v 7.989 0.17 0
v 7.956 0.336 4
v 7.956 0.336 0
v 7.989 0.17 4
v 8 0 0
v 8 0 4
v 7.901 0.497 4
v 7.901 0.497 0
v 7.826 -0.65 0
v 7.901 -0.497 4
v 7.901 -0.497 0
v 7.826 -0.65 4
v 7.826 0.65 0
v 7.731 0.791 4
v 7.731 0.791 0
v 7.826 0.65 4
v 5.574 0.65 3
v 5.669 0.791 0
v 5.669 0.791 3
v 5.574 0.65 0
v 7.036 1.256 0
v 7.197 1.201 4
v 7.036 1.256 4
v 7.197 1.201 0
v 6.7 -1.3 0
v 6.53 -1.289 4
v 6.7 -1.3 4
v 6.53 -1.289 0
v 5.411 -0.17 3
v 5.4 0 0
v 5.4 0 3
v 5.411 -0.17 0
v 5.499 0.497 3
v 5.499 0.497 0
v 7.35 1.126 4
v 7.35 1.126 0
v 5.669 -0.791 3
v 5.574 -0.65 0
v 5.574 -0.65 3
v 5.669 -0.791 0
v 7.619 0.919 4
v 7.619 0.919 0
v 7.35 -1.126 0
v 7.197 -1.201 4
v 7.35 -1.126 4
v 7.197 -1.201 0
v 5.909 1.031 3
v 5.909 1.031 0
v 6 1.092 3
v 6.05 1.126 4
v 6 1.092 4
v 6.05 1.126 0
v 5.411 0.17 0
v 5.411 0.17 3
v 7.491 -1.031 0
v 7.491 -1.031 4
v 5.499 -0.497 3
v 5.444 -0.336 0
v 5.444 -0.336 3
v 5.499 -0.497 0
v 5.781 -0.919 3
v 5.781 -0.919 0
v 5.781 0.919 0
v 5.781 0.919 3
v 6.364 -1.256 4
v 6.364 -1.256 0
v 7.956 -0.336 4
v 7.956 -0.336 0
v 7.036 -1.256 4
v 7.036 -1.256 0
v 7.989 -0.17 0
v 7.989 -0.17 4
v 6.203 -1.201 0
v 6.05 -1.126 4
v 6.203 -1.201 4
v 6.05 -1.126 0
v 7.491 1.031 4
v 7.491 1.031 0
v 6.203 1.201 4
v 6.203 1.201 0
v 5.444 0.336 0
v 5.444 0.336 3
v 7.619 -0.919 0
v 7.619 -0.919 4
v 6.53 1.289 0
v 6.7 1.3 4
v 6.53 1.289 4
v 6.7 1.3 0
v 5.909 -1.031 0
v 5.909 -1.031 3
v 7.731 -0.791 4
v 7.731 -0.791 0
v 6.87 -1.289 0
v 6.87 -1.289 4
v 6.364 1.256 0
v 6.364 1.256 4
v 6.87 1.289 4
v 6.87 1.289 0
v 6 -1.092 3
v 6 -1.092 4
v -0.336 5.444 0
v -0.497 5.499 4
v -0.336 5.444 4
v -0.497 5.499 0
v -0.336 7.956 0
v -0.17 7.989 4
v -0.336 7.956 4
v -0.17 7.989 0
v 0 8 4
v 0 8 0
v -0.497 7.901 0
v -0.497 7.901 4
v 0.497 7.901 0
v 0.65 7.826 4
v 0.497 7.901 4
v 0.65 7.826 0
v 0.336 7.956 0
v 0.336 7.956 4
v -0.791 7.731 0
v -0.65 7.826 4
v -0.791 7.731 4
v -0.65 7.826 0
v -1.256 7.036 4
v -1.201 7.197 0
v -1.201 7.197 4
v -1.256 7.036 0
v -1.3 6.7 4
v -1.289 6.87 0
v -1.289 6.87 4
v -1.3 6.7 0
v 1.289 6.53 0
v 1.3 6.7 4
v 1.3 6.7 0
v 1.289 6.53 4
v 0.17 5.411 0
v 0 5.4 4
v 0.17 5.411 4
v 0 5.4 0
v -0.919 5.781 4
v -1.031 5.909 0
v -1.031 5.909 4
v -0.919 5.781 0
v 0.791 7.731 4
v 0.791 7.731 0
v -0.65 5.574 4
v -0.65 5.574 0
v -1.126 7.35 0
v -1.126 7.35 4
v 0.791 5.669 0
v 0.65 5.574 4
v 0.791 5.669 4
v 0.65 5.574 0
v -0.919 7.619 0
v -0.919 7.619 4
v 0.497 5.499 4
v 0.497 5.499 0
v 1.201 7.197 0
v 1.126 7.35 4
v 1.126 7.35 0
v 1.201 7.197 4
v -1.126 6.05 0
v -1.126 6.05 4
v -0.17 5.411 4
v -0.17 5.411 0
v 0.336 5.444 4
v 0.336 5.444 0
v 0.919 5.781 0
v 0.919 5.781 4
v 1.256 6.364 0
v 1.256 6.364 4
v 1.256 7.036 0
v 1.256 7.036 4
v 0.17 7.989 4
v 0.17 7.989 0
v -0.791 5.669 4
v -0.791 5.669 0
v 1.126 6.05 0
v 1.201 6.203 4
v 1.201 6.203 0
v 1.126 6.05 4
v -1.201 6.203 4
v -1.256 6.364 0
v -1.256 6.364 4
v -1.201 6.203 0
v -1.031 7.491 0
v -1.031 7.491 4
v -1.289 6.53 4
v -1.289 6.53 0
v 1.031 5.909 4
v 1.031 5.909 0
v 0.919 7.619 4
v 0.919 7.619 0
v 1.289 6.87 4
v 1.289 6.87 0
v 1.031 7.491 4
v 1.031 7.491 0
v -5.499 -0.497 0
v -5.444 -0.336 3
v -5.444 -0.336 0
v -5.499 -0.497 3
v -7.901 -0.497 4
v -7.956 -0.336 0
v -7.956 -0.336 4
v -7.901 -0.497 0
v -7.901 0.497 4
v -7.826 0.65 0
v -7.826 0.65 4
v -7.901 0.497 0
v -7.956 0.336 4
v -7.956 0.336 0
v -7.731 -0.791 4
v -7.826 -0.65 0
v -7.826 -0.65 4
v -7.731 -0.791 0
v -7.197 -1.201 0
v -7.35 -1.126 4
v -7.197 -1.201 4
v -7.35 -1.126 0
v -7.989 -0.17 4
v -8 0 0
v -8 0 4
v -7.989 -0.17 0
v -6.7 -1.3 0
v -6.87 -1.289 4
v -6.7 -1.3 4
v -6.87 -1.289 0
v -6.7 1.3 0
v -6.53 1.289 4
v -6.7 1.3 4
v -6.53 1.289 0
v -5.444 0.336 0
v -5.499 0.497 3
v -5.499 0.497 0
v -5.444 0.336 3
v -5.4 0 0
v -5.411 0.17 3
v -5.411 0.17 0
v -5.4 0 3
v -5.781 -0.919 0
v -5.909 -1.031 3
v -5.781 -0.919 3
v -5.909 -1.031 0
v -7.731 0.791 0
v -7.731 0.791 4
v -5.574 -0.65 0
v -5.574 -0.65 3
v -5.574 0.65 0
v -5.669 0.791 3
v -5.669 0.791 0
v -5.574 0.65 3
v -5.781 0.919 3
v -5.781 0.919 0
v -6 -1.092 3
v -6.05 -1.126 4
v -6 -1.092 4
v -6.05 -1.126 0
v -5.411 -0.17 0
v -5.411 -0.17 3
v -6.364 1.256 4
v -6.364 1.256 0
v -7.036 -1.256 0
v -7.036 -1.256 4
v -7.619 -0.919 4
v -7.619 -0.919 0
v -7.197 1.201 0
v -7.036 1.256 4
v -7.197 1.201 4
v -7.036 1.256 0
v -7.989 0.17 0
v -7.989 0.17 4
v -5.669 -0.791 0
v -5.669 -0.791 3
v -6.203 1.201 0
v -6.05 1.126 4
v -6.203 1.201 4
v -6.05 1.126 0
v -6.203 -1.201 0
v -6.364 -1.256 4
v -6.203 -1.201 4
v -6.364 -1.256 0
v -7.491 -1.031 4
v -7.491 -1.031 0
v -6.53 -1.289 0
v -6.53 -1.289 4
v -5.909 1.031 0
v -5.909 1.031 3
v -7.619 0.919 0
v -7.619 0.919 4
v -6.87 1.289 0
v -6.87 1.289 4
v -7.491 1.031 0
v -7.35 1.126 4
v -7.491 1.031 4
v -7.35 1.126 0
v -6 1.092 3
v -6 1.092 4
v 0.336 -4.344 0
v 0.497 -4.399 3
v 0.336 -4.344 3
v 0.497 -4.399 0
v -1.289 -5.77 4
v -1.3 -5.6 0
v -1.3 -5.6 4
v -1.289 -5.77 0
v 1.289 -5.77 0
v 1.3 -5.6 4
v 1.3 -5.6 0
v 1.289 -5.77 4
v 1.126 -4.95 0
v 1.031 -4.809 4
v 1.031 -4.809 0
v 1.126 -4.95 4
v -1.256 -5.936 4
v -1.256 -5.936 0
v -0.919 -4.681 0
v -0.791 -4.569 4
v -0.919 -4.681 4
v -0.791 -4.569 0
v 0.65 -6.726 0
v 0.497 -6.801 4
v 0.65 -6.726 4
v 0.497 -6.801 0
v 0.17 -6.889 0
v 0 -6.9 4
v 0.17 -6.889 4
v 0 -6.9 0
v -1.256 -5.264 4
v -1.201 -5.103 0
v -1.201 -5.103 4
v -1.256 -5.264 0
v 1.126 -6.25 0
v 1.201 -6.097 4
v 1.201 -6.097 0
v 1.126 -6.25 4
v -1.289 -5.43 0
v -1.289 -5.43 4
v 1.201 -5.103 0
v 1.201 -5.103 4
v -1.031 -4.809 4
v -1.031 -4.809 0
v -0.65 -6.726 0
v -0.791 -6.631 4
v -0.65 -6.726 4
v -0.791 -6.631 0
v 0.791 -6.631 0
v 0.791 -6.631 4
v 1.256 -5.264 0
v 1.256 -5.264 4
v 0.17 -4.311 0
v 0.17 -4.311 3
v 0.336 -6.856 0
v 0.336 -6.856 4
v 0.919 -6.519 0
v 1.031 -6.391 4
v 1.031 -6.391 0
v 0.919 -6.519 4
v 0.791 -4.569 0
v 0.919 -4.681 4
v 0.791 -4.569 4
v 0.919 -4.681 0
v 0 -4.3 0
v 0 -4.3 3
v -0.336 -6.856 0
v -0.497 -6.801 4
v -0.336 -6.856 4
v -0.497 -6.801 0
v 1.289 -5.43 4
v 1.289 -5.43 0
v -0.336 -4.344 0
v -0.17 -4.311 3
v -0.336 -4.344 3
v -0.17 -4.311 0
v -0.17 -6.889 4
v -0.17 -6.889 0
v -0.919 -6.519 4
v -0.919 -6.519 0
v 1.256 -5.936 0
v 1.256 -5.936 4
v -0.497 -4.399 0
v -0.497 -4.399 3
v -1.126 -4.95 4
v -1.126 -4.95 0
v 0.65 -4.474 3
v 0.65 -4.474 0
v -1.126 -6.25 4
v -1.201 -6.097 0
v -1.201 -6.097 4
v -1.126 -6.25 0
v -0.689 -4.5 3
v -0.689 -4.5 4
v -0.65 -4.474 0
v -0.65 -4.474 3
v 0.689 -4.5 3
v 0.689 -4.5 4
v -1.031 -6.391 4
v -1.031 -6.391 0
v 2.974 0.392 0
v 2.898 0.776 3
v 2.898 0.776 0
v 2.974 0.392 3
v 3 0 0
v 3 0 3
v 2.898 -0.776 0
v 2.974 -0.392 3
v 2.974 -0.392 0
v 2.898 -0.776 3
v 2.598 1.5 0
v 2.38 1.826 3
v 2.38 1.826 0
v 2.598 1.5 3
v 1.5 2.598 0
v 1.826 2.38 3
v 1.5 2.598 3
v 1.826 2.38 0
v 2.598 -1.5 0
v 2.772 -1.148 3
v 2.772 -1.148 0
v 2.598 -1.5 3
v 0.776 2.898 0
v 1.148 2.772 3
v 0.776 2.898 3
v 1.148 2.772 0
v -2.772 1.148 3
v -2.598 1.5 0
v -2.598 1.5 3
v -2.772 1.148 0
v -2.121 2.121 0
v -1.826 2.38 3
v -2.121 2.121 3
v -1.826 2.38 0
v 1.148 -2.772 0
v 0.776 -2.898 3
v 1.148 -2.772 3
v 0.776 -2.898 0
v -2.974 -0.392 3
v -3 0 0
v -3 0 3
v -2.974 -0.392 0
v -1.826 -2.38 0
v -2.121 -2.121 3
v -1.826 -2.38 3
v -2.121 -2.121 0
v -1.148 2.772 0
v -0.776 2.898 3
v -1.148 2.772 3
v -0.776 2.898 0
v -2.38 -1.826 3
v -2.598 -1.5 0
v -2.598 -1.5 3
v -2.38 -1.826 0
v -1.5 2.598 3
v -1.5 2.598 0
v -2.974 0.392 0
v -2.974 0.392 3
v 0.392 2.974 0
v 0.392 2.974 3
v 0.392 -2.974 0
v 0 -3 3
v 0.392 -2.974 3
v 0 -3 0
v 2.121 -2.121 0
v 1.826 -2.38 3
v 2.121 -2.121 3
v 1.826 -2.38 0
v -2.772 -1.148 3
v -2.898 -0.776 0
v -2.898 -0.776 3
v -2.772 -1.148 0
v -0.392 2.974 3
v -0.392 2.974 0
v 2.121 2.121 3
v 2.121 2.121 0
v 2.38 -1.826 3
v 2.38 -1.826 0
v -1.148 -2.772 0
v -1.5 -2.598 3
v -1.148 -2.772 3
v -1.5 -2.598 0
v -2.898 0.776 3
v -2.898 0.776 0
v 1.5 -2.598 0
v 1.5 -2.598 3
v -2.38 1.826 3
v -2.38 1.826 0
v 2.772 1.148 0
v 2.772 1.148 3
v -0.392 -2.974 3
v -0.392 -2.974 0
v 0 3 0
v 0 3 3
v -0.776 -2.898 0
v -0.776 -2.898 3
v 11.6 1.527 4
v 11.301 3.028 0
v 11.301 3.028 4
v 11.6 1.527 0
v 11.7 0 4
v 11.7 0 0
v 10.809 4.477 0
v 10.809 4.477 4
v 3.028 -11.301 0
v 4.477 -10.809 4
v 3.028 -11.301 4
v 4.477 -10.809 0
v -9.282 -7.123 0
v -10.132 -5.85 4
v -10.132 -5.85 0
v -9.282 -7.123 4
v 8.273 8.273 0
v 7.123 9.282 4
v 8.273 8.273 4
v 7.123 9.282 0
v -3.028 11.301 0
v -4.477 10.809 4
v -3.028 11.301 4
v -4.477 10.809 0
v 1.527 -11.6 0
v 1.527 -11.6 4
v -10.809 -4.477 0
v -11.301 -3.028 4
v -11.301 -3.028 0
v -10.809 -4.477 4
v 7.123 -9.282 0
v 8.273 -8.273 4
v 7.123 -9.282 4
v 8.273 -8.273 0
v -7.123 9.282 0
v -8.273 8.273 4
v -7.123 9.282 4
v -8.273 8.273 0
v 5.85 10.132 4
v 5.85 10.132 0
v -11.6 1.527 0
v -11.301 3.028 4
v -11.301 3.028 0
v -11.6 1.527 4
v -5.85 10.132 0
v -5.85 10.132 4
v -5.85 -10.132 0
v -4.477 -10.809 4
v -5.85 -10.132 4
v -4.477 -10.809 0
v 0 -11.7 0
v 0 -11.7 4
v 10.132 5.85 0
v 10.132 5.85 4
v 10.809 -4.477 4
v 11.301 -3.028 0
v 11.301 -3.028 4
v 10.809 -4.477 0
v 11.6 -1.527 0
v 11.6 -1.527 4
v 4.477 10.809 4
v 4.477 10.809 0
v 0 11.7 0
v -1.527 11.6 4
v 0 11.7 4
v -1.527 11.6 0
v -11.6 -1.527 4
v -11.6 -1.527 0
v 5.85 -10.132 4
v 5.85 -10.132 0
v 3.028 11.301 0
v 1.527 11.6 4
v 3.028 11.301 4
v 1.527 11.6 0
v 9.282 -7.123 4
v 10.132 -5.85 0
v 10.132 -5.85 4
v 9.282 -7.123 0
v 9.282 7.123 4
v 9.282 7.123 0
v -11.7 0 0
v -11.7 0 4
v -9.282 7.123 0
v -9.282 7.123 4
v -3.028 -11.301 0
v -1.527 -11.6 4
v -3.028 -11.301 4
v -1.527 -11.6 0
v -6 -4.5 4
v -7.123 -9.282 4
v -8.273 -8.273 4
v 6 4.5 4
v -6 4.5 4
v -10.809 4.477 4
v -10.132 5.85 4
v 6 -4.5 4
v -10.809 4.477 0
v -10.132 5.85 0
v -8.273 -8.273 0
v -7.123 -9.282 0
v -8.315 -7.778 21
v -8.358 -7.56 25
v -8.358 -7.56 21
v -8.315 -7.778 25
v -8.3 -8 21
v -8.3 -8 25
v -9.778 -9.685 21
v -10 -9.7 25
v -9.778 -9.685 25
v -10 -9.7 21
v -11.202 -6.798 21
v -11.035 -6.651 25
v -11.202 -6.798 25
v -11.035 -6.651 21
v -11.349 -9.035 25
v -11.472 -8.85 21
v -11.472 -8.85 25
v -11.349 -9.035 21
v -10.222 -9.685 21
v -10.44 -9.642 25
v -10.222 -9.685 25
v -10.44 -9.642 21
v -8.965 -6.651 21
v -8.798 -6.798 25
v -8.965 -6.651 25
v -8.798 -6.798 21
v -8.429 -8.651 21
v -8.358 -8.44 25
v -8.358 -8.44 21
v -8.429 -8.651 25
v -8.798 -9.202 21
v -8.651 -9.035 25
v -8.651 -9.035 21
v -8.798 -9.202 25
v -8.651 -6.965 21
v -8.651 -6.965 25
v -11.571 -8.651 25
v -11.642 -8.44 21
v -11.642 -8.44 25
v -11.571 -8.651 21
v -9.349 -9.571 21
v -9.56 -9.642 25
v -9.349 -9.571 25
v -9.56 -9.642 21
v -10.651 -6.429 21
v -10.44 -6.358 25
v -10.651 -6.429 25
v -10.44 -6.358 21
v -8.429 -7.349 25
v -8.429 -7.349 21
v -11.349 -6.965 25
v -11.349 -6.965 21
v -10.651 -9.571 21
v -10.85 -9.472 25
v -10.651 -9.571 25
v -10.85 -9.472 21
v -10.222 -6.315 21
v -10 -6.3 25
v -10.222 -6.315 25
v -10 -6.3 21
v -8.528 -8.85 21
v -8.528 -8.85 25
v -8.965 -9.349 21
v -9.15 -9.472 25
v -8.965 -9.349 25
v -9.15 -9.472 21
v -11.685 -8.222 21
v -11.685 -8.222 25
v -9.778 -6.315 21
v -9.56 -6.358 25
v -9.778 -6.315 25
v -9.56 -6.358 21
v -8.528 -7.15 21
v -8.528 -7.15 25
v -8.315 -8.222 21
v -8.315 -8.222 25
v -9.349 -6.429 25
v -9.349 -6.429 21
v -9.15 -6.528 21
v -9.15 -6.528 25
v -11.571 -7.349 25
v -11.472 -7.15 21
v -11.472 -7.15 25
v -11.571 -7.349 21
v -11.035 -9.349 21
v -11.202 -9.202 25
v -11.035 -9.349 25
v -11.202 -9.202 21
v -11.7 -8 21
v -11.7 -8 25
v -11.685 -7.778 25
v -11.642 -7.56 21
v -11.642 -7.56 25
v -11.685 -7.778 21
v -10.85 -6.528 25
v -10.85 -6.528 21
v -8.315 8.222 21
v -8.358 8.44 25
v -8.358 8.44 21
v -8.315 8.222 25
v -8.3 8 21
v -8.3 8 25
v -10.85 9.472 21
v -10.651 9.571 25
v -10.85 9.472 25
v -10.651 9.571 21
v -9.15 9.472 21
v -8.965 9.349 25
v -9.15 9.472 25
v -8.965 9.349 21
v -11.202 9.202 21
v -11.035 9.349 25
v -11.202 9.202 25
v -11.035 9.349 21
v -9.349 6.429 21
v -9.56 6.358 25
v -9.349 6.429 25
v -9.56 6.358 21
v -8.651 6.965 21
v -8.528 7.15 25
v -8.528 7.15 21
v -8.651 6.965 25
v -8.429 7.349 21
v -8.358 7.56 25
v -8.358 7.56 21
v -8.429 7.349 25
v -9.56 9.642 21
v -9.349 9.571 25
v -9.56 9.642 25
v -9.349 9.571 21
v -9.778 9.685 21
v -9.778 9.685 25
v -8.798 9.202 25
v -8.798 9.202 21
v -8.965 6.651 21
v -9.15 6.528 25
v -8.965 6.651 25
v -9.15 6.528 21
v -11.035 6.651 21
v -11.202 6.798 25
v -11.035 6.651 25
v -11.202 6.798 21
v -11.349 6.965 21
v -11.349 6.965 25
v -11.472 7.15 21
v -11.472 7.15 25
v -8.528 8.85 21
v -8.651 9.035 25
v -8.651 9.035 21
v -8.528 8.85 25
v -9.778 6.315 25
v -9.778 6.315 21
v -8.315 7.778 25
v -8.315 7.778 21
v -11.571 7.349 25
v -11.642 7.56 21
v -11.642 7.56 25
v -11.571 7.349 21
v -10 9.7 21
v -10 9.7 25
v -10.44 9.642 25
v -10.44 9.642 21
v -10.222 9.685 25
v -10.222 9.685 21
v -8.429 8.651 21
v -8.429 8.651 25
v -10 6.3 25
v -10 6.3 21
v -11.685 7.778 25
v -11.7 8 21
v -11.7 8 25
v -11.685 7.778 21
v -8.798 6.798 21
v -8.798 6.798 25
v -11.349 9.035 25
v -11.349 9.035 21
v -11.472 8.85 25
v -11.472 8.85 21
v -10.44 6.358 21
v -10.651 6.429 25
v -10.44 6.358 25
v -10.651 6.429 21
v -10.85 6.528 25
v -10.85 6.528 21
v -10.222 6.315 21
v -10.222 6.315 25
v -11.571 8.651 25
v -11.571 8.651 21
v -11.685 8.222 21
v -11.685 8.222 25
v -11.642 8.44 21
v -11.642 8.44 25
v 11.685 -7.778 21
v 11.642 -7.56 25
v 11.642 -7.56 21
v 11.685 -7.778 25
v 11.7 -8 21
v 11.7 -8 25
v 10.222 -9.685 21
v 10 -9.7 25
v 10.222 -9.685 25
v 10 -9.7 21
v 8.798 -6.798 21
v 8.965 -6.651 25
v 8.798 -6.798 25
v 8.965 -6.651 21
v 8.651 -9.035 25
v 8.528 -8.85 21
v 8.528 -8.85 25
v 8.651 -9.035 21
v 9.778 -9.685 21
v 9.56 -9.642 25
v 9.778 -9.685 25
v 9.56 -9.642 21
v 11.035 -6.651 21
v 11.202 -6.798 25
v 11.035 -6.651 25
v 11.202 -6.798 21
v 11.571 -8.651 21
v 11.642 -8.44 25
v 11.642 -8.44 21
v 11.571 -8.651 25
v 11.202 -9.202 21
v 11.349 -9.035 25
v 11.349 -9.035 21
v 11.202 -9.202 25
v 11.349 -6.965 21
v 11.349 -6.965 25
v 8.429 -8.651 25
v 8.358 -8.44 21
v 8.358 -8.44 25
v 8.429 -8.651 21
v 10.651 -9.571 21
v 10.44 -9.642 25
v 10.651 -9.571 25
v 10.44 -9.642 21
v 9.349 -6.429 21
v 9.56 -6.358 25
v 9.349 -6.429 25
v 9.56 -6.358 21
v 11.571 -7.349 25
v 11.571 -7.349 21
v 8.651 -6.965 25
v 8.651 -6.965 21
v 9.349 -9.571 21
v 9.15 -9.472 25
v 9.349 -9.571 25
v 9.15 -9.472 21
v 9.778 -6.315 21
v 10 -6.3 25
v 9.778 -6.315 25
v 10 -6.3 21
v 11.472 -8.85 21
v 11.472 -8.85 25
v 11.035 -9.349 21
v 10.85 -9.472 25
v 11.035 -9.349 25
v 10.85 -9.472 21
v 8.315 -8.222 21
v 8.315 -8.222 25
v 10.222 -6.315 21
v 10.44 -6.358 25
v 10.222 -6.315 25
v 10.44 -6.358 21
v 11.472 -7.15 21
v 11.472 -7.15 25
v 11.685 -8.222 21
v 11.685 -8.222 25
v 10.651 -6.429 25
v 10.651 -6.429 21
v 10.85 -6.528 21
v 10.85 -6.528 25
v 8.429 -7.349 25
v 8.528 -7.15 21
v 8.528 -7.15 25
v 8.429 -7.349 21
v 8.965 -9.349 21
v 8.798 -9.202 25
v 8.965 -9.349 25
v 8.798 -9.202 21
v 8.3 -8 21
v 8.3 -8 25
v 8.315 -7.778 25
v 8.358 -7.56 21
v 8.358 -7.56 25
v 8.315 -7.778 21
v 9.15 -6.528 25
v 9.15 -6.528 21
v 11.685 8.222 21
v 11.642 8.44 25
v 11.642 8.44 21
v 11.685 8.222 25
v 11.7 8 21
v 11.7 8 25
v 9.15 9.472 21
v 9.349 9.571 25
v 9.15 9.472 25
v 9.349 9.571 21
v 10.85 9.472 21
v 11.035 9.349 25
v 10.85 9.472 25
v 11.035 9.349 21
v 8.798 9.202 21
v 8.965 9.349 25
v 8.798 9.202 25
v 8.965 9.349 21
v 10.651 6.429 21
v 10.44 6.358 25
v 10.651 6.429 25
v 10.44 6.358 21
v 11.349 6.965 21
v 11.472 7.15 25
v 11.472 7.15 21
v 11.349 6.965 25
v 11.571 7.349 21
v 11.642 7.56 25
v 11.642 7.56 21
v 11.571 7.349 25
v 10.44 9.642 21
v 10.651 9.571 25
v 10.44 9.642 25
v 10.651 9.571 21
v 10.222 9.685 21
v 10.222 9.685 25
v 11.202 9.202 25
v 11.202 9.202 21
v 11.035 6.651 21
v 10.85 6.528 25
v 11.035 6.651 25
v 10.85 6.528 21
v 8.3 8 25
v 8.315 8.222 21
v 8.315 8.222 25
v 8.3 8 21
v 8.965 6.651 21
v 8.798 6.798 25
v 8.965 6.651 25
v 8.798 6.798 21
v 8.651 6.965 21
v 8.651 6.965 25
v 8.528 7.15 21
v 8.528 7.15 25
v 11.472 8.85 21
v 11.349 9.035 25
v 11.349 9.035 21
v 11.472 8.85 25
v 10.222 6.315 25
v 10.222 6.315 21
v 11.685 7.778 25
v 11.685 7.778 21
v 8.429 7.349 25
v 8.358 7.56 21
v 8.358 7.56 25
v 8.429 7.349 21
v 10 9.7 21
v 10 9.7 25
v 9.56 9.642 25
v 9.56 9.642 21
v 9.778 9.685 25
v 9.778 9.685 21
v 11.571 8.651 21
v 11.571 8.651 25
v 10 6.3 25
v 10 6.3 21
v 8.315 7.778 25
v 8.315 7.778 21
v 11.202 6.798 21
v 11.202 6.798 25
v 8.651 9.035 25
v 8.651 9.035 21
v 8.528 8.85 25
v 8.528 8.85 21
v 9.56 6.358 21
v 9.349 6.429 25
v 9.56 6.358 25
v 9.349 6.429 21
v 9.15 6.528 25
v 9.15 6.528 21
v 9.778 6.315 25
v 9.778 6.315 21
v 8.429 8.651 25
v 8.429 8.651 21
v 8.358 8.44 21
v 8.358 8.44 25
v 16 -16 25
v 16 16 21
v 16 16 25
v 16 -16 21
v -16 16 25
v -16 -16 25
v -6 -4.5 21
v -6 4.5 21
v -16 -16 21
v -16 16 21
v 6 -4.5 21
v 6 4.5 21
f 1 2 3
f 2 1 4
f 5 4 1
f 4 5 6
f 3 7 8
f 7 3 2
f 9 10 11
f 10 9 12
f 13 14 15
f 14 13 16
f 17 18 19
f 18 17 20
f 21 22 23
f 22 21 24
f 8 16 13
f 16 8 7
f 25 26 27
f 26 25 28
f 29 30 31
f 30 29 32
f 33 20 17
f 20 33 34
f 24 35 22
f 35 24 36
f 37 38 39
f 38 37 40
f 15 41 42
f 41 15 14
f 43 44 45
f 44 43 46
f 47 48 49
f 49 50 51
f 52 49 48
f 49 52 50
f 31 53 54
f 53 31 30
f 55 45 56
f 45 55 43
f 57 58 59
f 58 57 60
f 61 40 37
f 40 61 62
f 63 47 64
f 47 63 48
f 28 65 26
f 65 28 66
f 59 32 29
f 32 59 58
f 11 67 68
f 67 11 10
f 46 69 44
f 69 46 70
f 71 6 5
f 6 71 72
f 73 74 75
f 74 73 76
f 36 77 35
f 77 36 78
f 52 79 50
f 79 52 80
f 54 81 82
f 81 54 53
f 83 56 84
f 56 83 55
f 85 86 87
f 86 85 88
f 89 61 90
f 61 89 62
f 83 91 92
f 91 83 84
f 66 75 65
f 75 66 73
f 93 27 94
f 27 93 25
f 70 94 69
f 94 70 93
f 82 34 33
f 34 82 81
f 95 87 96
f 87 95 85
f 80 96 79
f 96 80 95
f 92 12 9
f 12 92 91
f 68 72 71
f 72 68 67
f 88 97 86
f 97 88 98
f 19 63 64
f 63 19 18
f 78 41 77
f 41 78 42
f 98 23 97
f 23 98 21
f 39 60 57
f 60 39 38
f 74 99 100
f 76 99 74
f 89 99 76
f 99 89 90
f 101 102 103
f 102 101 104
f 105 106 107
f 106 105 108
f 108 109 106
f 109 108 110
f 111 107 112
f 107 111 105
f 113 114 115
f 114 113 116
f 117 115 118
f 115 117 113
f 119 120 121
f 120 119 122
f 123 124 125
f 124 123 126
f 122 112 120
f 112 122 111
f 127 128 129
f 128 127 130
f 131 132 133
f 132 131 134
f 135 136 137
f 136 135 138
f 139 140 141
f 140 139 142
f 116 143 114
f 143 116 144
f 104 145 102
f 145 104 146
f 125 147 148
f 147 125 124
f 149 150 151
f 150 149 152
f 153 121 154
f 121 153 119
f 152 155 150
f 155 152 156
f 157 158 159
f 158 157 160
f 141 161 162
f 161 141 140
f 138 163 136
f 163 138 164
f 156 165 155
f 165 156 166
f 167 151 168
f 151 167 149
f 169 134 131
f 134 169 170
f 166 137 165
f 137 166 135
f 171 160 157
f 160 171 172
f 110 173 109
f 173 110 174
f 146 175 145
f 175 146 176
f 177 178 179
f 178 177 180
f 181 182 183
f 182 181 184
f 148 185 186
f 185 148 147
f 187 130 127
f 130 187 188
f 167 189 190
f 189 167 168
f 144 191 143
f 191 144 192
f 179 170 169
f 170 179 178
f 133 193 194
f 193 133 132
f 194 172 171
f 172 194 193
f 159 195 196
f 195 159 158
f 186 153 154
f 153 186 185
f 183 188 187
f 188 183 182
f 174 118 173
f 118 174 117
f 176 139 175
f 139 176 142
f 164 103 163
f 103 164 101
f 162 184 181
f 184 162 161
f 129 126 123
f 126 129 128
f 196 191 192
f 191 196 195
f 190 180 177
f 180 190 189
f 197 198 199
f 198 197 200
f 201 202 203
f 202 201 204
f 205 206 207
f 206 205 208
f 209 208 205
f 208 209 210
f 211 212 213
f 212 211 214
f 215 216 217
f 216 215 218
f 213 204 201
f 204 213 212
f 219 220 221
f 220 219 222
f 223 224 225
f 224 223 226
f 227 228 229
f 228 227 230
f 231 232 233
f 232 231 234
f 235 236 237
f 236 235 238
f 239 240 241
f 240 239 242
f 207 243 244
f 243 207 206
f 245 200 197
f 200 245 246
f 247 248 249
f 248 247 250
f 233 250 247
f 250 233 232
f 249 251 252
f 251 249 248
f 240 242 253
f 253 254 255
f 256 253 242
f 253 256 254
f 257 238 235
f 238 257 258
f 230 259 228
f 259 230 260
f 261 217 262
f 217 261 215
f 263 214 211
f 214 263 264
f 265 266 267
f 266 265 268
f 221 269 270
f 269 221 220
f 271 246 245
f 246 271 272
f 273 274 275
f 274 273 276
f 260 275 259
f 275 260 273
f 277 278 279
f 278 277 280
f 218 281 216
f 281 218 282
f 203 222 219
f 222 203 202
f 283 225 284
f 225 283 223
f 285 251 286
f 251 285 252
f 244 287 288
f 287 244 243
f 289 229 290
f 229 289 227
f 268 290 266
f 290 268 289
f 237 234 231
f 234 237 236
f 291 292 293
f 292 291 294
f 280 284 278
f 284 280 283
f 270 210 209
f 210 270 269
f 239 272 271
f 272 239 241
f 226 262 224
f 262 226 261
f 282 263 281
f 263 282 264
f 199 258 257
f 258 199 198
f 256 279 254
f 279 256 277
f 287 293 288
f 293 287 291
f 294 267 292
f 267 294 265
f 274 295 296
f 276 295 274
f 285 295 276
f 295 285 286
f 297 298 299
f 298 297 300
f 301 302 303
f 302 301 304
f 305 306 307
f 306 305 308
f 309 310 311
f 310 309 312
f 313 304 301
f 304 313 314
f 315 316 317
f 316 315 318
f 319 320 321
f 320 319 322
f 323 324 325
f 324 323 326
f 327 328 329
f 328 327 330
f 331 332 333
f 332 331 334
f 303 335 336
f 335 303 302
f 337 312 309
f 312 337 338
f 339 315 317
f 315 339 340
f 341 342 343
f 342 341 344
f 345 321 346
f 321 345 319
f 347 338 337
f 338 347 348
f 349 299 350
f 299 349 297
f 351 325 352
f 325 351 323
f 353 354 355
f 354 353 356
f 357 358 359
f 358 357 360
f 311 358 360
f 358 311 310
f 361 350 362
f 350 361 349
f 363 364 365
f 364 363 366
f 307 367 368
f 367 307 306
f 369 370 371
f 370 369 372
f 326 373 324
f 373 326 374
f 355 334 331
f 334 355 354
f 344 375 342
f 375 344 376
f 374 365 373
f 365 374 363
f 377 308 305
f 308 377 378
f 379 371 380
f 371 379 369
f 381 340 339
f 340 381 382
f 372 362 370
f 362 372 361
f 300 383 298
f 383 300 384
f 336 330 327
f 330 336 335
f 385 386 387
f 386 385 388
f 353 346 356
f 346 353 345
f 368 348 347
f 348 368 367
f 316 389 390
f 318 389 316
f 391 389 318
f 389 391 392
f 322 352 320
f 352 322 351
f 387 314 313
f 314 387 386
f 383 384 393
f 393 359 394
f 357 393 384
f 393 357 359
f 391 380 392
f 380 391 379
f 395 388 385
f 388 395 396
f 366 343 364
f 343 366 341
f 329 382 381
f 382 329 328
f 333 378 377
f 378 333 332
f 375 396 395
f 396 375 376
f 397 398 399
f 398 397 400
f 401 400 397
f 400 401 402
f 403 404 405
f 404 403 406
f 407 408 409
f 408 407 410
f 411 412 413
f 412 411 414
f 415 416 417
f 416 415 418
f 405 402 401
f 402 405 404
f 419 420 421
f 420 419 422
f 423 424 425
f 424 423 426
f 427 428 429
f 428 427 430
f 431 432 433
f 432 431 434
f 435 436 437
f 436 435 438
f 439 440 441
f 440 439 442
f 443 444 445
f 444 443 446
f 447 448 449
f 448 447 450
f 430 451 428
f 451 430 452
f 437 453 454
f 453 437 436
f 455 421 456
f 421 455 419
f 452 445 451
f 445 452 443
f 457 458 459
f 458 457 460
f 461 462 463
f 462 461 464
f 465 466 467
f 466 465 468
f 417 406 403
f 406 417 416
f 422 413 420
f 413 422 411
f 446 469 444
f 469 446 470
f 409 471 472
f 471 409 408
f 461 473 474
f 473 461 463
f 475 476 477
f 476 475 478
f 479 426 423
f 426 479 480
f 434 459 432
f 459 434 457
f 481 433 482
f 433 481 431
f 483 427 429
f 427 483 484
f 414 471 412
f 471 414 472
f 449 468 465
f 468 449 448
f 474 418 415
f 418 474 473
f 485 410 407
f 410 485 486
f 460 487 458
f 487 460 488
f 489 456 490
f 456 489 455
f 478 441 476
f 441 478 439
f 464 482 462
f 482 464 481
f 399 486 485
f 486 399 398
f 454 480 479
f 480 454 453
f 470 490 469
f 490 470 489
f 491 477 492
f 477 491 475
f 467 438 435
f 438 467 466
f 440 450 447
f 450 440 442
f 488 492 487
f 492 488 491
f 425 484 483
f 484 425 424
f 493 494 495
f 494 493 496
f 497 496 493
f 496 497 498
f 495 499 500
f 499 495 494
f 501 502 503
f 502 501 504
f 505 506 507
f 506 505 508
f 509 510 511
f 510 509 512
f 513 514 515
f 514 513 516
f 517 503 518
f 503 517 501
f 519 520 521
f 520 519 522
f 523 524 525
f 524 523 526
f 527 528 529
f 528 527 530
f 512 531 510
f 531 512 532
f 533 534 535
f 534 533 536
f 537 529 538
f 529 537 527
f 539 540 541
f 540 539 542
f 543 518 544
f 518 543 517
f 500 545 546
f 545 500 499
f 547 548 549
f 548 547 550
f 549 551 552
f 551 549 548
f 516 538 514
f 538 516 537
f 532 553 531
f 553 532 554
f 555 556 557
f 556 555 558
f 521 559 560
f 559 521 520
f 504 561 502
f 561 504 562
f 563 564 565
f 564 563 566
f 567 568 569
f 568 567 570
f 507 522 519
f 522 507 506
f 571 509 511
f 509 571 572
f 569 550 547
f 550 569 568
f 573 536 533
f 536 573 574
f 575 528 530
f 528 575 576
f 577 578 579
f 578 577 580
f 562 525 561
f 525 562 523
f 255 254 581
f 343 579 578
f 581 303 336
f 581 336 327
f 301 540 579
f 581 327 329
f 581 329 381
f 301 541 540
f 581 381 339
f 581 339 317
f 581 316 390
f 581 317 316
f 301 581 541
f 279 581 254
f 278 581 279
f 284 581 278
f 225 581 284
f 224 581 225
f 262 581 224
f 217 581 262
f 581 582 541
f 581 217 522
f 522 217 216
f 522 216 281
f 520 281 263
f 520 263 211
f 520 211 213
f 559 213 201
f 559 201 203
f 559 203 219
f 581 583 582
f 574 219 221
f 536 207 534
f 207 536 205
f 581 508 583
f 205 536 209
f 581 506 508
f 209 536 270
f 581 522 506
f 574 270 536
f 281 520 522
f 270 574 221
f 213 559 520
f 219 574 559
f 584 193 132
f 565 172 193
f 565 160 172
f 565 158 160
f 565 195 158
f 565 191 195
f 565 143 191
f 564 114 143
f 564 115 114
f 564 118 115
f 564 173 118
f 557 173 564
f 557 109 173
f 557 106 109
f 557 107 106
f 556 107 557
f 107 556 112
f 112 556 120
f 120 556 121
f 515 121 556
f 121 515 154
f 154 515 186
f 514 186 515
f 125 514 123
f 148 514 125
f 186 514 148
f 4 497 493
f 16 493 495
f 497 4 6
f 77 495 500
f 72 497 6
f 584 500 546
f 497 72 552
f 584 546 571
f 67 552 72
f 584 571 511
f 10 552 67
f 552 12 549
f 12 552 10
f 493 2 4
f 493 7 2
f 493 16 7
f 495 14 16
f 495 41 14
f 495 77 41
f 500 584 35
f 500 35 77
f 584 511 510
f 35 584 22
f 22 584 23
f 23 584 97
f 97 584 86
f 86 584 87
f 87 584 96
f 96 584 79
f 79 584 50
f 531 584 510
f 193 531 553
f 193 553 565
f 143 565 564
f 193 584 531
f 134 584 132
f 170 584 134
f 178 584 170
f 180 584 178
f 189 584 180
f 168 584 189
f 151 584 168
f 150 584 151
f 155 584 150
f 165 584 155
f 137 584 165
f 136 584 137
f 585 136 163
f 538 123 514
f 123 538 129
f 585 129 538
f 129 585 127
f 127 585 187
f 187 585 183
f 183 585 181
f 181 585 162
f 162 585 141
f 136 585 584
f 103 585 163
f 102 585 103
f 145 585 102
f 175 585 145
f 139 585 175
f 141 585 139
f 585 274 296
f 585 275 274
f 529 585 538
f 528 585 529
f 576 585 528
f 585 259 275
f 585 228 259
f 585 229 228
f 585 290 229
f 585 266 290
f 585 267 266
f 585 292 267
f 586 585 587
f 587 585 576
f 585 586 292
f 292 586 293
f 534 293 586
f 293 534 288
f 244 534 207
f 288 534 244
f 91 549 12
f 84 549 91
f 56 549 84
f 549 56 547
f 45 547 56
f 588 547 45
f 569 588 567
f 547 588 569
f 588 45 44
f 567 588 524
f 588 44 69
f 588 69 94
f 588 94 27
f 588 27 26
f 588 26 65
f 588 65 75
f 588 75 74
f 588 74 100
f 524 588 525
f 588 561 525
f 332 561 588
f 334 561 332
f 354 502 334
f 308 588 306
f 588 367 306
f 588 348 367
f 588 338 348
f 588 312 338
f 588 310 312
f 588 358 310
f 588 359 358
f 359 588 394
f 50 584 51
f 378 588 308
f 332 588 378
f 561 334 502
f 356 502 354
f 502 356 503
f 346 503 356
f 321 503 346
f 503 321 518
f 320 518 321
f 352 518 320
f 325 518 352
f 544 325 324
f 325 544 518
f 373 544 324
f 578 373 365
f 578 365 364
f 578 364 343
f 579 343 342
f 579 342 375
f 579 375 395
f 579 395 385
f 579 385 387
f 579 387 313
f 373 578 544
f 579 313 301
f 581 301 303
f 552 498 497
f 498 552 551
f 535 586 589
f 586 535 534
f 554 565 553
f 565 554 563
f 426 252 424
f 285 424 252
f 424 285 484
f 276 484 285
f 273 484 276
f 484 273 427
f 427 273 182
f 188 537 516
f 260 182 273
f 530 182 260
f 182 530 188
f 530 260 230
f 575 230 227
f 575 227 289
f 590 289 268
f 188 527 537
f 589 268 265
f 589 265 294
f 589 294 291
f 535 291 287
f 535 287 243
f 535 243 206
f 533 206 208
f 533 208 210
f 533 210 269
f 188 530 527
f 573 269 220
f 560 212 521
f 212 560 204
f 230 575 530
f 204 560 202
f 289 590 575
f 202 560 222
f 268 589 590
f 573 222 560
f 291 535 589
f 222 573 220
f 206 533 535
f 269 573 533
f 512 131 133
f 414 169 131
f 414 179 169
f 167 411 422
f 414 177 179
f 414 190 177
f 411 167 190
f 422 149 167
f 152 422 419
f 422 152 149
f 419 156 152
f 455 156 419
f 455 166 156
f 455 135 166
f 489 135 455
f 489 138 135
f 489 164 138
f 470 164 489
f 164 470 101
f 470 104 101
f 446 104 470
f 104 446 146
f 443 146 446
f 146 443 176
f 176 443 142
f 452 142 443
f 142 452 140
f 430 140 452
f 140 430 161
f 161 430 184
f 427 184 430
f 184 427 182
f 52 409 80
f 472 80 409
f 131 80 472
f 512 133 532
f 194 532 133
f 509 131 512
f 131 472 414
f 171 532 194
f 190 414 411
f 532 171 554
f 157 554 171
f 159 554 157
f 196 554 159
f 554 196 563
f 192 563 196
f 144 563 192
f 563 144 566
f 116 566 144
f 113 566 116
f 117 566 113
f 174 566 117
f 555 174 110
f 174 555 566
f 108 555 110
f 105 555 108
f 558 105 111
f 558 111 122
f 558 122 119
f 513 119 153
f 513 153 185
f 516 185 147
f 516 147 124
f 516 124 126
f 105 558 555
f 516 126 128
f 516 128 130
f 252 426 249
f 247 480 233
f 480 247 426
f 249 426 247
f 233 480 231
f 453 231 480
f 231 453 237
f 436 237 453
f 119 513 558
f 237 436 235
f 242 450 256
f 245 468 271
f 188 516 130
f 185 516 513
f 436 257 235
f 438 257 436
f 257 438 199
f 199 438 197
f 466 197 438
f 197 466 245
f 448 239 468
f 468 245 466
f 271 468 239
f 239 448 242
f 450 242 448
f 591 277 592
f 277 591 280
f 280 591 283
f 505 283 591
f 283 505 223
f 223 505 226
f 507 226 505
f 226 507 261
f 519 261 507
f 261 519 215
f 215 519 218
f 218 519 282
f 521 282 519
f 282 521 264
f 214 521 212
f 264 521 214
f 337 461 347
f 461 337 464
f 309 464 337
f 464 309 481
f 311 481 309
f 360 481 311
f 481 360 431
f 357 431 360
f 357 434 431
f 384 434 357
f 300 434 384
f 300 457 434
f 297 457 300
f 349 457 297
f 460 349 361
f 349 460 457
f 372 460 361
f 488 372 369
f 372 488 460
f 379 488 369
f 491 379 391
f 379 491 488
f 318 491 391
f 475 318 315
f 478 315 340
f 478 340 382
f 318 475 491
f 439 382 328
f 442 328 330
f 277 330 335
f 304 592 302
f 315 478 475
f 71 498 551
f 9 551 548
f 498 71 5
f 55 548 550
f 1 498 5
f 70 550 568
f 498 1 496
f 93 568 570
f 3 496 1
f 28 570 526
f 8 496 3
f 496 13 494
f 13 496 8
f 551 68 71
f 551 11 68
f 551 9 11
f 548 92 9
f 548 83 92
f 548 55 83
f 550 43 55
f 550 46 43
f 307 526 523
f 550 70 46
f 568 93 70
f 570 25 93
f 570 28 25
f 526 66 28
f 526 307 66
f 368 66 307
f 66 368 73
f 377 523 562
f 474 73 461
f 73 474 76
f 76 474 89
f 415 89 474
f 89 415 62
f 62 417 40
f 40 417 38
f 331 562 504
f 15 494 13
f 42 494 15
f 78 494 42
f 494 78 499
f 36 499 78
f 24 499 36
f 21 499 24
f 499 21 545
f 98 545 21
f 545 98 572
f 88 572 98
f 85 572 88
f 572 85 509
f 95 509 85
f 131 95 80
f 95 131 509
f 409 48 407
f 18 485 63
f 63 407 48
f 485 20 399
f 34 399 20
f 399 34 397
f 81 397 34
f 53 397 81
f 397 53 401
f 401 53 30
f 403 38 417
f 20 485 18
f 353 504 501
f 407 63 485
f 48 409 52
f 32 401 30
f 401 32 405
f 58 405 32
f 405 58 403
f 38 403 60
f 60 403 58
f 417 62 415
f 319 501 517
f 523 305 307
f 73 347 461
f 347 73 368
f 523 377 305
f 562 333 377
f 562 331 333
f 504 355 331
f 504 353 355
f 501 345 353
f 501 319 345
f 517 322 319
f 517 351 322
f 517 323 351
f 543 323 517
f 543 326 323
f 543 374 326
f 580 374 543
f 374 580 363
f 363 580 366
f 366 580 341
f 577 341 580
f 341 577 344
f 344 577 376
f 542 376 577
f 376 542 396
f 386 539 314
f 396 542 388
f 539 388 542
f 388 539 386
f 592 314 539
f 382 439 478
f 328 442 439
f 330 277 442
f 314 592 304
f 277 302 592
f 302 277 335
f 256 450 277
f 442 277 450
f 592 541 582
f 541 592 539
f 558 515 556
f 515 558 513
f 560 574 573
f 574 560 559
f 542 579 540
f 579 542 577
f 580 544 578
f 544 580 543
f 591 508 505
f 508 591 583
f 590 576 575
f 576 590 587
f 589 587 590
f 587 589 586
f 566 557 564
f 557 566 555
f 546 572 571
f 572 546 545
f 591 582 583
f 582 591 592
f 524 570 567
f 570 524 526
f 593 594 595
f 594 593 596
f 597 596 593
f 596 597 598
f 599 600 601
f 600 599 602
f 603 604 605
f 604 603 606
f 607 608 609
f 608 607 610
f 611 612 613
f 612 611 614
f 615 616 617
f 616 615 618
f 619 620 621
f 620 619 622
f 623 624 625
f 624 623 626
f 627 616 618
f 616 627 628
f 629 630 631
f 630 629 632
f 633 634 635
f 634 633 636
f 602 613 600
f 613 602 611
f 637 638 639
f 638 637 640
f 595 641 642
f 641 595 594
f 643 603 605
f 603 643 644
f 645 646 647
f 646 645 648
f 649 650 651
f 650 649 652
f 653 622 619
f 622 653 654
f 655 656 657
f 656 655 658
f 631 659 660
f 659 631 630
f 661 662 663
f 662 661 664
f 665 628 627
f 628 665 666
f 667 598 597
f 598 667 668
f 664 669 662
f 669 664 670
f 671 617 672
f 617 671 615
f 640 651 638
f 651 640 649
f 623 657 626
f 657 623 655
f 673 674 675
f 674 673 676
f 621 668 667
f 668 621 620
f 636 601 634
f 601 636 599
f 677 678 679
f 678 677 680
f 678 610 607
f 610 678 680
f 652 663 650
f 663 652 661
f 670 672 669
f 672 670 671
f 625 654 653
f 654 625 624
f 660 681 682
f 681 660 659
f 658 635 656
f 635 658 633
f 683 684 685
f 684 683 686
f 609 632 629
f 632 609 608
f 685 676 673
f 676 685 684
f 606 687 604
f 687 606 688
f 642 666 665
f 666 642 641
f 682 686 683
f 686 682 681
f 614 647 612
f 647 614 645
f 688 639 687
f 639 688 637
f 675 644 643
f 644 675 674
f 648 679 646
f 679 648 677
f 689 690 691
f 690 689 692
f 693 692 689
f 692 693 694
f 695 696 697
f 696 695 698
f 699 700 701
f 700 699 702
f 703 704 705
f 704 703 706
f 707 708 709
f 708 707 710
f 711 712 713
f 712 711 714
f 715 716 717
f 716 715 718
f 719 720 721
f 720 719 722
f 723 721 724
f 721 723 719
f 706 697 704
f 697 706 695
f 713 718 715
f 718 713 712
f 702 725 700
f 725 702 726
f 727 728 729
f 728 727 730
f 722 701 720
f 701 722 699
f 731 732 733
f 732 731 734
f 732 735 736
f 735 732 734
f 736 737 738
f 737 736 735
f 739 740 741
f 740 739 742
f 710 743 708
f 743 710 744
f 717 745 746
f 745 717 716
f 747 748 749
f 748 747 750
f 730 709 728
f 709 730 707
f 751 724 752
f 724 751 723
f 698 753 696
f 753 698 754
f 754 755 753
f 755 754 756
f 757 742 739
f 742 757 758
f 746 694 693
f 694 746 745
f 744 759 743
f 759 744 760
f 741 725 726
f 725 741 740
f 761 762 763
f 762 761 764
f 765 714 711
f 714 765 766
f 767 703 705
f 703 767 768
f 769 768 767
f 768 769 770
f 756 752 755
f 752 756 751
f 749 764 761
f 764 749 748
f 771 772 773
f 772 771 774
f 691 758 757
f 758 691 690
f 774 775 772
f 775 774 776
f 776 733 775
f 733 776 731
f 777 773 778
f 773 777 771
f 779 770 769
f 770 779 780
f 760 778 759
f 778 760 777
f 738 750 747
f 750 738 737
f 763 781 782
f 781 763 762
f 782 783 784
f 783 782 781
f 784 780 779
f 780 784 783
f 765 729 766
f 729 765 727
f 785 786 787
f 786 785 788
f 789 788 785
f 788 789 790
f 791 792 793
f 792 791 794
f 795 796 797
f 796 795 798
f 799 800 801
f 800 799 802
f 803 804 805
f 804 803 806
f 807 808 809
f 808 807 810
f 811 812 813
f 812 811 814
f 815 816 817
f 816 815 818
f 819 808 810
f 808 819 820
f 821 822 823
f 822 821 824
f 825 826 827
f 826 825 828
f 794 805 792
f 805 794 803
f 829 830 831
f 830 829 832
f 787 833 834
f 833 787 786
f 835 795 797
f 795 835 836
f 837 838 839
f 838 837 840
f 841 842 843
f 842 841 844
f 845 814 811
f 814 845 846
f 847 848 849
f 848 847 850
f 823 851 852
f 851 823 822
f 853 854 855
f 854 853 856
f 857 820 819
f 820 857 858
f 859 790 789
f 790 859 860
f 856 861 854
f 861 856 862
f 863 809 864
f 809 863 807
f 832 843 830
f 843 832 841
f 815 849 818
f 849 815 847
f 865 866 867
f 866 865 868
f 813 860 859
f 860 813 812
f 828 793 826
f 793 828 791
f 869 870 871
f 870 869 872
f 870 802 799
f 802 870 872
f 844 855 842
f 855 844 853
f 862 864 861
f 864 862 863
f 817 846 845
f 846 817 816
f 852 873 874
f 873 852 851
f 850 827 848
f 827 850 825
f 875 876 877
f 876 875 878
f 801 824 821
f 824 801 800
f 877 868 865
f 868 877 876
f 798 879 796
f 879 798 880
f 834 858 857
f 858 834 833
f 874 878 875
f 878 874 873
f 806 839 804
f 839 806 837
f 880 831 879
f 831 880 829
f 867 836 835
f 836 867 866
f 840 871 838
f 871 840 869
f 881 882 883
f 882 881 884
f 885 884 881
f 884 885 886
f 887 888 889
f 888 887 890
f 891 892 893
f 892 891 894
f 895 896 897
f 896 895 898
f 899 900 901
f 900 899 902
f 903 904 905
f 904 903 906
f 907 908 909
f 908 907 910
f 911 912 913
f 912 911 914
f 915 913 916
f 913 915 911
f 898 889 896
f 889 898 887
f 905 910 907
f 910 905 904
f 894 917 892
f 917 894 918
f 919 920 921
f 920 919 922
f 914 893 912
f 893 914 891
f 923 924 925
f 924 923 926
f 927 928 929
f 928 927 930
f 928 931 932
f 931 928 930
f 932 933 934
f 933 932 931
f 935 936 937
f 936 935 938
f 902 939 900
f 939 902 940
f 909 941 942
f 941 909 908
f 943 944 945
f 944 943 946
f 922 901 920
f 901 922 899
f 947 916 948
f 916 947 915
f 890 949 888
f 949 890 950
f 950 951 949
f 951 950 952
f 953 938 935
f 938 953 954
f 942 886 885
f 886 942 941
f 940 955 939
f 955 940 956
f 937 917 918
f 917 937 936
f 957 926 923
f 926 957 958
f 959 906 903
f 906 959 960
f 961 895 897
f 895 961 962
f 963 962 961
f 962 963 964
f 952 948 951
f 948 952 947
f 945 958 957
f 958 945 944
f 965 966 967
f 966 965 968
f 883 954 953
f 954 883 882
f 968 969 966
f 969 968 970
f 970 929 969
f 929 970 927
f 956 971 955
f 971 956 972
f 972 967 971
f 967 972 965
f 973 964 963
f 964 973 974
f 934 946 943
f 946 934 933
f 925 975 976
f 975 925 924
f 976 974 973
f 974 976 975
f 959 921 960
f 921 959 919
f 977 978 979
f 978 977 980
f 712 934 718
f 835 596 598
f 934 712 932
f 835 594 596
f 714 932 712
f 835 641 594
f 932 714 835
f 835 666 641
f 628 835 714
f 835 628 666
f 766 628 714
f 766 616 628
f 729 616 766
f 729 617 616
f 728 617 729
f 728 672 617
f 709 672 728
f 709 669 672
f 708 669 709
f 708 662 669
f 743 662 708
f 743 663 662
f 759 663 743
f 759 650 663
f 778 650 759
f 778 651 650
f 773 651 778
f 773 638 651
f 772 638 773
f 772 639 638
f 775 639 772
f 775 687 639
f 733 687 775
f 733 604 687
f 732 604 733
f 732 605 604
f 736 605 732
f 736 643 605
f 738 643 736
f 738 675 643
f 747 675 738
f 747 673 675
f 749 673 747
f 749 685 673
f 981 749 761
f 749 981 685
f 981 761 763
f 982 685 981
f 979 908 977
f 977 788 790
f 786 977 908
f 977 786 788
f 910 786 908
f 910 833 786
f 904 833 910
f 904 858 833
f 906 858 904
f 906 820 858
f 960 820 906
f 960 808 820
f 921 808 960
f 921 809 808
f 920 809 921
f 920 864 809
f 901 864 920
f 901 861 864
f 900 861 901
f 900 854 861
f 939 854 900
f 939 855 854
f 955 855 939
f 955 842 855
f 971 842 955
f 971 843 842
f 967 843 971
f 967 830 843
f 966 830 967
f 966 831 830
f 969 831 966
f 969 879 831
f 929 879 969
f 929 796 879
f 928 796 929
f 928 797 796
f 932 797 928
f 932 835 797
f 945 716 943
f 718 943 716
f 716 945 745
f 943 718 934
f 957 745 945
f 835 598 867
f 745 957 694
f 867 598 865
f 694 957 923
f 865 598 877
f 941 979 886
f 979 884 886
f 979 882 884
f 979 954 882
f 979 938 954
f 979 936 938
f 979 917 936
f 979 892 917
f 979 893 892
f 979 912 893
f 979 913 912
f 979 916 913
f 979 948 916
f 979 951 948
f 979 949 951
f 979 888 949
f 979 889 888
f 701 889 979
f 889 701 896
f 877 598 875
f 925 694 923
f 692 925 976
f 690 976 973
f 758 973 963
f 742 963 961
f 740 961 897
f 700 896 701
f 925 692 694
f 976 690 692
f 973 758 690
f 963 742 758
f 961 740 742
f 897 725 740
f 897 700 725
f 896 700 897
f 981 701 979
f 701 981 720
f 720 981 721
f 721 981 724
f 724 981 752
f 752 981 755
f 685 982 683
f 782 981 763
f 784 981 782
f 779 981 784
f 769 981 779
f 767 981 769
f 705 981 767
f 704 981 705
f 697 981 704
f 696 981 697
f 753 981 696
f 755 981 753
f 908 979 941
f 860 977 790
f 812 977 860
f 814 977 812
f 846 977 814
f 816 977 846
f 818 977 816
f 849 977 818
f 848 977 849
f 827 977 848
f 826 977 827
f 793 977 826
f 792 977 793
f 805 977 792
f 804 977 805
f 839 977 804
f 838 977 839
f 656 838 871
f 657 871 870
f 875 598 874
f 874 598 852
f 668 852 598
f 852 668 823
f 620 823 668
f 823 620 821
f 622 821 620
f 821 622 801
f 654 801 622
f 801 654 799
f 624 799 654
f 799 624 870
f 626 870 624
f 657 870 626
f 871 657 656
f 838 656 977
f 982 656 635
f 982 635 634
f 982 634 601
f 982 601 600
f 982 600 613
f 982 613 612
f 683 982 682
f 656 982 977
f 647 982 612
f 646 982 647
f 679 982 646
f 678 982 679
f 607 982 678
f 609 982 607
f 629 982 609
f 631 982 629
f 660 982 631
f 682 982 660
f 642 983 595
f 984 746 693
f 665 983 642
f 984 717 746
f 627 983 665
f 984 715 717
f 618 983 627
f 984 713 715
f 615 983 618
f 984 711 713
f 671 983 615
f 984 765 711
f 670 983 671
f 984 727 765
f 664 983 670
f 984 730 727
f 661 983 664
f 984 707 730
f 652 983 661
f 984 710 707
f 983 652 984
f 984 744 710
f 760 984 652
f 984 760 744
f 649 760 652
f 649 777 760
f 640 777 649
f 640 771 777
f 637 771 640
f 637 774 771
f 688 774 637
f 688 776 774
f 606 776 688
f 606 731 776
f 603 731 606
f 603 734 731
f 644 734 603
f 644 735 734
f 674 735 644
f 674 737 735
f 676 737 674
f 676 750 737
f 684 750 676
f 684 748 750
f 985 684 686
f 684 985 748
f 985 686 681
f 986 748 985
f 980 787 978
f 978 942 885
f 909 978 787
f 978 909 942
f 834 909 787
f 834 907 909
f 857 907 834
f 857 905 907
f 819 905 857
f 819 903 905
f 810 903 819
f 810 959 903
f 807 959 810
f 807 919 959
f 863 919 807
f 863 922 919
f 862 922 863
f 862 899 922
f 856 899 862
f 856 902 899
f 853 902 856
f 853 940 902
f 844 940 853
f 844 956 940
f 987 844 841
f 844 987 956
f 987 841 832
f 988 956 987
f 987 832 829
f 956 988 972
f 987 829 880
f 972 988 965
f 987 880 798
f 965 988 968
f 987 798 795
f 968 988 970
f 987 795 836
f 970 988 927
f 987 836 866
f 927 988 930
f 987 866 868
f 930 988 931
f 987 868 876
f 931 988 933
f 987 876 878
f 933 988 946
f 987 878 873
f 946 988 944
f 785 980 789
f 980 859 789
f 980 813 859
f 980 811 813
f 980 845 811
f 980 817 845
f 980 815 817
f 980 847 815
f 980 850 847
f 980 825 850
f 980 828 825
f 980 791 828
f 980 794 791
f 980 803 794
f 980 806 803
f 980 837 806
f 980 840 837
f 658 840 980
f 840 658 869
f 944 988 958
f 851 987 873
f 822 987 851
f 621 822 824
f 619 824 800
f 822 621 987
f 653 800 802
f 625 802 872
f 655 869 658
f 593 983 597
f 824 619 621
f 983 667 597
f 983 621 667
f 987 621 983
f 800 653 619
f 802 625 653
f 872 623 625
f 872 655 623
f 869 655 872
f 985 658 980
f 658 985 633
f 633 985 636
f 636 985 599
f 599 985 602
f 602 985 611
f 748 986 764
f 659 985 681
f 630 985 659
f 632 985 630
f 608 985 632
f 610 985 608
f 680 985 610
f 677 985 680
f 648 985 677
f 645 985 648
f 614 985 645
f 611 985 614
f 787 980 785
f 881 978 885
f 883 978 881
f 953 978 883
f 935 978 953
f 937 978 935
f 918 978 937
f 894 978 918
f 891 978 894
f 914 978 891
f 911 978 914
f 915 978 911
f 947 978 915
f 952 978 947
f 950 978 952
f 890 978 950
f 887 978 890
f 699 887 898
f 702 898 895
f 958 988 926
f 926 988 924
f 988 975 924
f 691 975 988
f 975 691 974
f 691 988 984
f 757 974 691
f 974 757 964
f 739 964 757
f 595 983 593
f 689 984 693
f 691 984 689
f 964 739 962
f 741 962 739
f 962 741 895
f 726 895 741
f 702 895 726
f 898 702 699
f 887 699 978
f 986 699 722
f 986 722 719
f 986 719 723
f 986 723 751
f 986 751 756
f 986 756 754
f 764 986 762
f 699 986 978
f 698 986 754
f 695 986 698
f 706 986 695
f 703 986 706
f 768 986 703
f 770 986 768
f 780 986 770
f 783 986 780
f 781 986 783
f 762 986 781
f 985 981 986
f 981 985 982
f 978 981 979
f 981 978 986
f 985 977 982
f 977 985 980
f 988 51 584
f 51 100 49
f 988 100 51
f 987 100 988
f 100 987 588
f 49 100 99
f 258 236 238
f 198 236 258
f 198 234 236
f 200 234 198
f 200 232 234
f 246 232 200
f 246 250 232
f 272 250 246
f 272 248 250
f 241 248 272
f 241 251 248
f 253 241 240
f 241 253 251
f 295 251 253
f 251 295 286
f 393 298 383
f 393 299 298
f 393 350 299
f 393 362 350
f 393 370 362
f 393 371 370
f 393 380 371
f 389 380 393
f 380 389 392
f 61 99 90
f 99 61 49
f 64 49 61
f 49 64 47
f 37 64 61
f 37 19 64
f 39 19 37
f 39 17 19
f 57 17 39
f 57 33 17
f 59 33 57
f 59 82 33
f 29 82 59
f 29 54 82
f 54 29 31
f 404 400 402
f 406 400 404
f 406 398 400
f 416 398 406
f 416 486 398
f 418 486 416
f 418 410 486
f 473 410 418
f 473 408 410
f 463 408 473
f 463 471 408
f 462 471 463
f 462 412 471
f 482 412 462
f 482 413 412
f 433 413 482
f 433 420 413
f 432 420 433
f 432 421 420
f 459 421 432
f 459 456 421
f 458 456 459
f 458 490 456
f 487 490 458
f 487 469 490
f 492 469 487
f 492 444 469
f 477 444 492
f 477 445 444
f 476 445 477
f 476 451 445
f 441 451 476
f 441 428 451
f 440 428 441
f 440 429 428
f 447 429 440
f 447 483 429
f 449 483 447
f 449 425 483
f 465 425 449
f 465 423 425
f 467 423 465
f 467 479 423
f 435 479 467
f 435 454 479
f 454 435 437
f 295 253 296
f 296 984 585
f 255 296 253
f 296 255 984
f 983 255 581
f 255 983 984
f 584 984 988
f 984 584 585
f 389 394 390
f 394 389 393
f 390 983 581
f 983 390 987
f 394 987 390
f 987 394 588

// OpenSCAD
// file: helpers.scad
// Shared building blocks. Convention: every part's own joint-to-joint axis
// is local Z, so end plates are naturally perpendicular to it and holes bore
// straight along Z. Whole parts get rotated into the world only when placed
// into an assembly view - never inside a single part's own file.
include <params.scad>

// A boss with a heat-set-insert bore, sized to sit inside a wall.
module insert_boss(h) {
    difference() {
        cylinder(d = insert_d + wall, h = h);
        translate([0, 0, h - insert_depth])
            cylinder(d = insert_d, h = insert_depth + 0.1);
    }
}

// Four insert bosses in a rectangle, base sitting on z=0.
module bolt_pattern(x, y, h) {
    for (sx = [-1, 1]) for (sy = [-1, 1])
        translate([sx * x / 2, sy * y / 2, 0]) insert_boss(h);
}

// Clearance holes through a slab of thickness h, for the mating part.
module bolt_holes(x, y, d, h) {
    for (sx = [-1, 1]) for (sy = [-1, 1])
        translate([sx * x / 2, sy * y / 2, -0.1]) cylinder(d = d, h = h + 0.2);
}

// Horn-side bolt circle, holes along Z, through a slab of thickness h - see
// params.scad for why the fourth hole sits at a smaller radius.
module horn_bolt_circle(h) {
    for (a = [0, 90, 180]) rotate([0, 0, a])
        translate([horn_bolt_r_major, 0, -0.1]) cylinder(d = horn_bolt_d, h = h + 0.2);
    rotate([0, 0, 270]) translate([horn_bolt_r_minor, 0, -0.1])
        cylinder(d = horn_bolt_d, h = h + 0.2);
    translate([0, 0, -0.1]) cylinder(d = horn_hub_d, h = h + 0.2);
}

// A round plate carrying the horn bolt circle, face normal along Z, sitting
// at z=[0,h]. This is what a leg segment bolts to a servo's rotating horn.
module horn_plate(h) {
    d = horn_bolt_r_major * 2 + 10;
    difference() {
        cylinder(d = d, h = h);
        horn_bolt_circle(h);
    }
}

// A square plate carrying the bracket's own flange holes - ADJUSTABLE, see
// params.scad. This is what a leg segment bolts to the downloaded bracket.
module bracket_plate(h) {
    side = bracket_hole_x + 12;
    difference() {
        translate([-side / 2, -side / 2, 0]) cube([side, side, h]);
        bolt_holes(bracket_hole_x, bracket_hole_y, bracket_screw_d, h);
    }
}

// The ST3215 body pocket: servo drops in from the open top, its case (not
// the gearbox) bearing on the lip.
module servo_pocket(depth) {
    l = servo_l + 2 * servo_fit;
    w = servo_w + 2 * servo_fit;
    translate([-l / 2, -w / 2, 0]) cube([l, w, depth + 0.1]);
}
// file: params.scad
// ==================== source of truth ====================
// Every VERIFIED number below is cross-referenced to either this repo's own
// simulation model (src/robot_cat_description/urdf/cat.urdf.xacro at scale
// 1.0, and robot_cat_gait/leg_ik.py) or an independently checked datasheet -
// see hardware/cad/README.md for exactly what was checked and against what.
//
// ADJUSTABLE numbers are flagged because the one thing they depend on - the
// downloaded servo bracket's own mounting face - could not be fetched from
// Printables/Thingiverse in this session (both block automated access).
// Print ONE part that uses an ADJUSTABLE value, hold it against the real
// bracket, correct the number, then print the rest. Everything else here is
// safe to print in full sets straight away.

// ---- leg geometry - VERIFIED, must match leg_ik.py exactly ----
thigh_length = 110;   // LegGeometry.thigh_length, axis to axis
calf_length  = 110;   // LegGeometry.calf_length, axis to paw centre
hip_offset   = 25;    // hip roll axis -> thigh pitch axis, lateral
foot_radius  = 12;    // paw pad sphere radius

// ---- trunk geometry - VERIFIED ----
hip_x = 110;          // hip mount, x from body centre (so 220mm hip-to-hip)
hip_y = 55;           // hip mount, y from body centre (so 110mm hip-to-hip)
body_length = 300;
body_width  = 111;
body_height = 141;

// ---- ST3215 servo body - VERIFIED: DFRobot product page (2962) and
// servodatabase.com both give 45.2 x 24.7 x 35.0 mm ----
servo_l = 45.2;
servo_w = 24.7;
servo_h = 35.0;
servo_fit = 0.4;      // FDM clearance added per side around the pocket

// ---- Raspberry Pi 5 mounting - VERIFIED against the official Raspberry Pi
// Ltd mechanical drawing (RP-008347-DS-1): 58 x 49mm hole spacing, Ø2.7mm
// holes (clearance for M2.5) ----
pi_hole_x = 58;
pi_hole_y = 49;
pi_hole_d = 2.9;       // add a touch over the datasheet 2.7 for FDM tolerance

// ---- ADJUSTABLE: servo horn bolt circle ----
// Reverse-measured from a real, printed, STS3215-based quadruped
// (github.com/garciamathias/OpenRoboticDog, hip_x4.stl) - NOT the servo
// datasheet, because no datasheet with this number could be reached. Four
// holes: three at 6.7mm radius, one at 5.6mm (verified asymmetric - this is
// what the real mesh measured, not a rounding choice). Treat this as a
// well-informed starting point, not gospel: confirm on the physical horn
// before drilling the rest.
horn_bolt_r_major = 6.7;
horn_bolt_r_minor = 5.6;   // the fourth hole sits closer to centre
horn_bolt_d = 2.6;         // self-tapping screw clearance
horn_hub_d = 6.0;          // splined output shaft boss, servo horn already has this - clearance only

// ---- ADJUSTABLE: bracket-to-frame flange ----
// Printables 653674 is described as exposing "4 standard M3 machine screws"
// on its outward face once mounted to the servo, but the exact spacing could
// not be fetched (site returns 403 to automated tools). Starting guess sized
// to comfortably clear the servo body's 24.7mm width. CONFIRM AND CORRECT
// against the downloaded bracket before printing the rest.
bracket_hole_x = 20;
bracket_hole_y = 16;
bracket_screw_d = 3.4;    // M3 clearance

// ---- print structure ----
wall = 4;             // load-bearing wall thickness in PETG
insert_d = 4.2;        // M3 brass heat-set insert bore
insert_depth = 6;
$fn = 48;
// main file
// hip_link. The short lateral offset from the hip/roll servo's horn (ID1)
// to the thigh/pitch servo's body (ID2, bolted on via the downloaded
// bracket). 25mm - VERIFIED, equals hip_offset in leg_ik.py.
include <params.scad>
include <helpers.scad>

spine_w = 12;
spine_h = 9;

module hip_link() {
    union() {
        horn_plate(wall);
        translate([0, 0, hip_offset - wall]) bracket_plate(wall);
        translate([-spine_w / 2, -spine_h / 2, wall - 1])
            cube([spine_w, spine_h, hip_offset - 2 * wall + 2]);
    }
}

hip_link();
